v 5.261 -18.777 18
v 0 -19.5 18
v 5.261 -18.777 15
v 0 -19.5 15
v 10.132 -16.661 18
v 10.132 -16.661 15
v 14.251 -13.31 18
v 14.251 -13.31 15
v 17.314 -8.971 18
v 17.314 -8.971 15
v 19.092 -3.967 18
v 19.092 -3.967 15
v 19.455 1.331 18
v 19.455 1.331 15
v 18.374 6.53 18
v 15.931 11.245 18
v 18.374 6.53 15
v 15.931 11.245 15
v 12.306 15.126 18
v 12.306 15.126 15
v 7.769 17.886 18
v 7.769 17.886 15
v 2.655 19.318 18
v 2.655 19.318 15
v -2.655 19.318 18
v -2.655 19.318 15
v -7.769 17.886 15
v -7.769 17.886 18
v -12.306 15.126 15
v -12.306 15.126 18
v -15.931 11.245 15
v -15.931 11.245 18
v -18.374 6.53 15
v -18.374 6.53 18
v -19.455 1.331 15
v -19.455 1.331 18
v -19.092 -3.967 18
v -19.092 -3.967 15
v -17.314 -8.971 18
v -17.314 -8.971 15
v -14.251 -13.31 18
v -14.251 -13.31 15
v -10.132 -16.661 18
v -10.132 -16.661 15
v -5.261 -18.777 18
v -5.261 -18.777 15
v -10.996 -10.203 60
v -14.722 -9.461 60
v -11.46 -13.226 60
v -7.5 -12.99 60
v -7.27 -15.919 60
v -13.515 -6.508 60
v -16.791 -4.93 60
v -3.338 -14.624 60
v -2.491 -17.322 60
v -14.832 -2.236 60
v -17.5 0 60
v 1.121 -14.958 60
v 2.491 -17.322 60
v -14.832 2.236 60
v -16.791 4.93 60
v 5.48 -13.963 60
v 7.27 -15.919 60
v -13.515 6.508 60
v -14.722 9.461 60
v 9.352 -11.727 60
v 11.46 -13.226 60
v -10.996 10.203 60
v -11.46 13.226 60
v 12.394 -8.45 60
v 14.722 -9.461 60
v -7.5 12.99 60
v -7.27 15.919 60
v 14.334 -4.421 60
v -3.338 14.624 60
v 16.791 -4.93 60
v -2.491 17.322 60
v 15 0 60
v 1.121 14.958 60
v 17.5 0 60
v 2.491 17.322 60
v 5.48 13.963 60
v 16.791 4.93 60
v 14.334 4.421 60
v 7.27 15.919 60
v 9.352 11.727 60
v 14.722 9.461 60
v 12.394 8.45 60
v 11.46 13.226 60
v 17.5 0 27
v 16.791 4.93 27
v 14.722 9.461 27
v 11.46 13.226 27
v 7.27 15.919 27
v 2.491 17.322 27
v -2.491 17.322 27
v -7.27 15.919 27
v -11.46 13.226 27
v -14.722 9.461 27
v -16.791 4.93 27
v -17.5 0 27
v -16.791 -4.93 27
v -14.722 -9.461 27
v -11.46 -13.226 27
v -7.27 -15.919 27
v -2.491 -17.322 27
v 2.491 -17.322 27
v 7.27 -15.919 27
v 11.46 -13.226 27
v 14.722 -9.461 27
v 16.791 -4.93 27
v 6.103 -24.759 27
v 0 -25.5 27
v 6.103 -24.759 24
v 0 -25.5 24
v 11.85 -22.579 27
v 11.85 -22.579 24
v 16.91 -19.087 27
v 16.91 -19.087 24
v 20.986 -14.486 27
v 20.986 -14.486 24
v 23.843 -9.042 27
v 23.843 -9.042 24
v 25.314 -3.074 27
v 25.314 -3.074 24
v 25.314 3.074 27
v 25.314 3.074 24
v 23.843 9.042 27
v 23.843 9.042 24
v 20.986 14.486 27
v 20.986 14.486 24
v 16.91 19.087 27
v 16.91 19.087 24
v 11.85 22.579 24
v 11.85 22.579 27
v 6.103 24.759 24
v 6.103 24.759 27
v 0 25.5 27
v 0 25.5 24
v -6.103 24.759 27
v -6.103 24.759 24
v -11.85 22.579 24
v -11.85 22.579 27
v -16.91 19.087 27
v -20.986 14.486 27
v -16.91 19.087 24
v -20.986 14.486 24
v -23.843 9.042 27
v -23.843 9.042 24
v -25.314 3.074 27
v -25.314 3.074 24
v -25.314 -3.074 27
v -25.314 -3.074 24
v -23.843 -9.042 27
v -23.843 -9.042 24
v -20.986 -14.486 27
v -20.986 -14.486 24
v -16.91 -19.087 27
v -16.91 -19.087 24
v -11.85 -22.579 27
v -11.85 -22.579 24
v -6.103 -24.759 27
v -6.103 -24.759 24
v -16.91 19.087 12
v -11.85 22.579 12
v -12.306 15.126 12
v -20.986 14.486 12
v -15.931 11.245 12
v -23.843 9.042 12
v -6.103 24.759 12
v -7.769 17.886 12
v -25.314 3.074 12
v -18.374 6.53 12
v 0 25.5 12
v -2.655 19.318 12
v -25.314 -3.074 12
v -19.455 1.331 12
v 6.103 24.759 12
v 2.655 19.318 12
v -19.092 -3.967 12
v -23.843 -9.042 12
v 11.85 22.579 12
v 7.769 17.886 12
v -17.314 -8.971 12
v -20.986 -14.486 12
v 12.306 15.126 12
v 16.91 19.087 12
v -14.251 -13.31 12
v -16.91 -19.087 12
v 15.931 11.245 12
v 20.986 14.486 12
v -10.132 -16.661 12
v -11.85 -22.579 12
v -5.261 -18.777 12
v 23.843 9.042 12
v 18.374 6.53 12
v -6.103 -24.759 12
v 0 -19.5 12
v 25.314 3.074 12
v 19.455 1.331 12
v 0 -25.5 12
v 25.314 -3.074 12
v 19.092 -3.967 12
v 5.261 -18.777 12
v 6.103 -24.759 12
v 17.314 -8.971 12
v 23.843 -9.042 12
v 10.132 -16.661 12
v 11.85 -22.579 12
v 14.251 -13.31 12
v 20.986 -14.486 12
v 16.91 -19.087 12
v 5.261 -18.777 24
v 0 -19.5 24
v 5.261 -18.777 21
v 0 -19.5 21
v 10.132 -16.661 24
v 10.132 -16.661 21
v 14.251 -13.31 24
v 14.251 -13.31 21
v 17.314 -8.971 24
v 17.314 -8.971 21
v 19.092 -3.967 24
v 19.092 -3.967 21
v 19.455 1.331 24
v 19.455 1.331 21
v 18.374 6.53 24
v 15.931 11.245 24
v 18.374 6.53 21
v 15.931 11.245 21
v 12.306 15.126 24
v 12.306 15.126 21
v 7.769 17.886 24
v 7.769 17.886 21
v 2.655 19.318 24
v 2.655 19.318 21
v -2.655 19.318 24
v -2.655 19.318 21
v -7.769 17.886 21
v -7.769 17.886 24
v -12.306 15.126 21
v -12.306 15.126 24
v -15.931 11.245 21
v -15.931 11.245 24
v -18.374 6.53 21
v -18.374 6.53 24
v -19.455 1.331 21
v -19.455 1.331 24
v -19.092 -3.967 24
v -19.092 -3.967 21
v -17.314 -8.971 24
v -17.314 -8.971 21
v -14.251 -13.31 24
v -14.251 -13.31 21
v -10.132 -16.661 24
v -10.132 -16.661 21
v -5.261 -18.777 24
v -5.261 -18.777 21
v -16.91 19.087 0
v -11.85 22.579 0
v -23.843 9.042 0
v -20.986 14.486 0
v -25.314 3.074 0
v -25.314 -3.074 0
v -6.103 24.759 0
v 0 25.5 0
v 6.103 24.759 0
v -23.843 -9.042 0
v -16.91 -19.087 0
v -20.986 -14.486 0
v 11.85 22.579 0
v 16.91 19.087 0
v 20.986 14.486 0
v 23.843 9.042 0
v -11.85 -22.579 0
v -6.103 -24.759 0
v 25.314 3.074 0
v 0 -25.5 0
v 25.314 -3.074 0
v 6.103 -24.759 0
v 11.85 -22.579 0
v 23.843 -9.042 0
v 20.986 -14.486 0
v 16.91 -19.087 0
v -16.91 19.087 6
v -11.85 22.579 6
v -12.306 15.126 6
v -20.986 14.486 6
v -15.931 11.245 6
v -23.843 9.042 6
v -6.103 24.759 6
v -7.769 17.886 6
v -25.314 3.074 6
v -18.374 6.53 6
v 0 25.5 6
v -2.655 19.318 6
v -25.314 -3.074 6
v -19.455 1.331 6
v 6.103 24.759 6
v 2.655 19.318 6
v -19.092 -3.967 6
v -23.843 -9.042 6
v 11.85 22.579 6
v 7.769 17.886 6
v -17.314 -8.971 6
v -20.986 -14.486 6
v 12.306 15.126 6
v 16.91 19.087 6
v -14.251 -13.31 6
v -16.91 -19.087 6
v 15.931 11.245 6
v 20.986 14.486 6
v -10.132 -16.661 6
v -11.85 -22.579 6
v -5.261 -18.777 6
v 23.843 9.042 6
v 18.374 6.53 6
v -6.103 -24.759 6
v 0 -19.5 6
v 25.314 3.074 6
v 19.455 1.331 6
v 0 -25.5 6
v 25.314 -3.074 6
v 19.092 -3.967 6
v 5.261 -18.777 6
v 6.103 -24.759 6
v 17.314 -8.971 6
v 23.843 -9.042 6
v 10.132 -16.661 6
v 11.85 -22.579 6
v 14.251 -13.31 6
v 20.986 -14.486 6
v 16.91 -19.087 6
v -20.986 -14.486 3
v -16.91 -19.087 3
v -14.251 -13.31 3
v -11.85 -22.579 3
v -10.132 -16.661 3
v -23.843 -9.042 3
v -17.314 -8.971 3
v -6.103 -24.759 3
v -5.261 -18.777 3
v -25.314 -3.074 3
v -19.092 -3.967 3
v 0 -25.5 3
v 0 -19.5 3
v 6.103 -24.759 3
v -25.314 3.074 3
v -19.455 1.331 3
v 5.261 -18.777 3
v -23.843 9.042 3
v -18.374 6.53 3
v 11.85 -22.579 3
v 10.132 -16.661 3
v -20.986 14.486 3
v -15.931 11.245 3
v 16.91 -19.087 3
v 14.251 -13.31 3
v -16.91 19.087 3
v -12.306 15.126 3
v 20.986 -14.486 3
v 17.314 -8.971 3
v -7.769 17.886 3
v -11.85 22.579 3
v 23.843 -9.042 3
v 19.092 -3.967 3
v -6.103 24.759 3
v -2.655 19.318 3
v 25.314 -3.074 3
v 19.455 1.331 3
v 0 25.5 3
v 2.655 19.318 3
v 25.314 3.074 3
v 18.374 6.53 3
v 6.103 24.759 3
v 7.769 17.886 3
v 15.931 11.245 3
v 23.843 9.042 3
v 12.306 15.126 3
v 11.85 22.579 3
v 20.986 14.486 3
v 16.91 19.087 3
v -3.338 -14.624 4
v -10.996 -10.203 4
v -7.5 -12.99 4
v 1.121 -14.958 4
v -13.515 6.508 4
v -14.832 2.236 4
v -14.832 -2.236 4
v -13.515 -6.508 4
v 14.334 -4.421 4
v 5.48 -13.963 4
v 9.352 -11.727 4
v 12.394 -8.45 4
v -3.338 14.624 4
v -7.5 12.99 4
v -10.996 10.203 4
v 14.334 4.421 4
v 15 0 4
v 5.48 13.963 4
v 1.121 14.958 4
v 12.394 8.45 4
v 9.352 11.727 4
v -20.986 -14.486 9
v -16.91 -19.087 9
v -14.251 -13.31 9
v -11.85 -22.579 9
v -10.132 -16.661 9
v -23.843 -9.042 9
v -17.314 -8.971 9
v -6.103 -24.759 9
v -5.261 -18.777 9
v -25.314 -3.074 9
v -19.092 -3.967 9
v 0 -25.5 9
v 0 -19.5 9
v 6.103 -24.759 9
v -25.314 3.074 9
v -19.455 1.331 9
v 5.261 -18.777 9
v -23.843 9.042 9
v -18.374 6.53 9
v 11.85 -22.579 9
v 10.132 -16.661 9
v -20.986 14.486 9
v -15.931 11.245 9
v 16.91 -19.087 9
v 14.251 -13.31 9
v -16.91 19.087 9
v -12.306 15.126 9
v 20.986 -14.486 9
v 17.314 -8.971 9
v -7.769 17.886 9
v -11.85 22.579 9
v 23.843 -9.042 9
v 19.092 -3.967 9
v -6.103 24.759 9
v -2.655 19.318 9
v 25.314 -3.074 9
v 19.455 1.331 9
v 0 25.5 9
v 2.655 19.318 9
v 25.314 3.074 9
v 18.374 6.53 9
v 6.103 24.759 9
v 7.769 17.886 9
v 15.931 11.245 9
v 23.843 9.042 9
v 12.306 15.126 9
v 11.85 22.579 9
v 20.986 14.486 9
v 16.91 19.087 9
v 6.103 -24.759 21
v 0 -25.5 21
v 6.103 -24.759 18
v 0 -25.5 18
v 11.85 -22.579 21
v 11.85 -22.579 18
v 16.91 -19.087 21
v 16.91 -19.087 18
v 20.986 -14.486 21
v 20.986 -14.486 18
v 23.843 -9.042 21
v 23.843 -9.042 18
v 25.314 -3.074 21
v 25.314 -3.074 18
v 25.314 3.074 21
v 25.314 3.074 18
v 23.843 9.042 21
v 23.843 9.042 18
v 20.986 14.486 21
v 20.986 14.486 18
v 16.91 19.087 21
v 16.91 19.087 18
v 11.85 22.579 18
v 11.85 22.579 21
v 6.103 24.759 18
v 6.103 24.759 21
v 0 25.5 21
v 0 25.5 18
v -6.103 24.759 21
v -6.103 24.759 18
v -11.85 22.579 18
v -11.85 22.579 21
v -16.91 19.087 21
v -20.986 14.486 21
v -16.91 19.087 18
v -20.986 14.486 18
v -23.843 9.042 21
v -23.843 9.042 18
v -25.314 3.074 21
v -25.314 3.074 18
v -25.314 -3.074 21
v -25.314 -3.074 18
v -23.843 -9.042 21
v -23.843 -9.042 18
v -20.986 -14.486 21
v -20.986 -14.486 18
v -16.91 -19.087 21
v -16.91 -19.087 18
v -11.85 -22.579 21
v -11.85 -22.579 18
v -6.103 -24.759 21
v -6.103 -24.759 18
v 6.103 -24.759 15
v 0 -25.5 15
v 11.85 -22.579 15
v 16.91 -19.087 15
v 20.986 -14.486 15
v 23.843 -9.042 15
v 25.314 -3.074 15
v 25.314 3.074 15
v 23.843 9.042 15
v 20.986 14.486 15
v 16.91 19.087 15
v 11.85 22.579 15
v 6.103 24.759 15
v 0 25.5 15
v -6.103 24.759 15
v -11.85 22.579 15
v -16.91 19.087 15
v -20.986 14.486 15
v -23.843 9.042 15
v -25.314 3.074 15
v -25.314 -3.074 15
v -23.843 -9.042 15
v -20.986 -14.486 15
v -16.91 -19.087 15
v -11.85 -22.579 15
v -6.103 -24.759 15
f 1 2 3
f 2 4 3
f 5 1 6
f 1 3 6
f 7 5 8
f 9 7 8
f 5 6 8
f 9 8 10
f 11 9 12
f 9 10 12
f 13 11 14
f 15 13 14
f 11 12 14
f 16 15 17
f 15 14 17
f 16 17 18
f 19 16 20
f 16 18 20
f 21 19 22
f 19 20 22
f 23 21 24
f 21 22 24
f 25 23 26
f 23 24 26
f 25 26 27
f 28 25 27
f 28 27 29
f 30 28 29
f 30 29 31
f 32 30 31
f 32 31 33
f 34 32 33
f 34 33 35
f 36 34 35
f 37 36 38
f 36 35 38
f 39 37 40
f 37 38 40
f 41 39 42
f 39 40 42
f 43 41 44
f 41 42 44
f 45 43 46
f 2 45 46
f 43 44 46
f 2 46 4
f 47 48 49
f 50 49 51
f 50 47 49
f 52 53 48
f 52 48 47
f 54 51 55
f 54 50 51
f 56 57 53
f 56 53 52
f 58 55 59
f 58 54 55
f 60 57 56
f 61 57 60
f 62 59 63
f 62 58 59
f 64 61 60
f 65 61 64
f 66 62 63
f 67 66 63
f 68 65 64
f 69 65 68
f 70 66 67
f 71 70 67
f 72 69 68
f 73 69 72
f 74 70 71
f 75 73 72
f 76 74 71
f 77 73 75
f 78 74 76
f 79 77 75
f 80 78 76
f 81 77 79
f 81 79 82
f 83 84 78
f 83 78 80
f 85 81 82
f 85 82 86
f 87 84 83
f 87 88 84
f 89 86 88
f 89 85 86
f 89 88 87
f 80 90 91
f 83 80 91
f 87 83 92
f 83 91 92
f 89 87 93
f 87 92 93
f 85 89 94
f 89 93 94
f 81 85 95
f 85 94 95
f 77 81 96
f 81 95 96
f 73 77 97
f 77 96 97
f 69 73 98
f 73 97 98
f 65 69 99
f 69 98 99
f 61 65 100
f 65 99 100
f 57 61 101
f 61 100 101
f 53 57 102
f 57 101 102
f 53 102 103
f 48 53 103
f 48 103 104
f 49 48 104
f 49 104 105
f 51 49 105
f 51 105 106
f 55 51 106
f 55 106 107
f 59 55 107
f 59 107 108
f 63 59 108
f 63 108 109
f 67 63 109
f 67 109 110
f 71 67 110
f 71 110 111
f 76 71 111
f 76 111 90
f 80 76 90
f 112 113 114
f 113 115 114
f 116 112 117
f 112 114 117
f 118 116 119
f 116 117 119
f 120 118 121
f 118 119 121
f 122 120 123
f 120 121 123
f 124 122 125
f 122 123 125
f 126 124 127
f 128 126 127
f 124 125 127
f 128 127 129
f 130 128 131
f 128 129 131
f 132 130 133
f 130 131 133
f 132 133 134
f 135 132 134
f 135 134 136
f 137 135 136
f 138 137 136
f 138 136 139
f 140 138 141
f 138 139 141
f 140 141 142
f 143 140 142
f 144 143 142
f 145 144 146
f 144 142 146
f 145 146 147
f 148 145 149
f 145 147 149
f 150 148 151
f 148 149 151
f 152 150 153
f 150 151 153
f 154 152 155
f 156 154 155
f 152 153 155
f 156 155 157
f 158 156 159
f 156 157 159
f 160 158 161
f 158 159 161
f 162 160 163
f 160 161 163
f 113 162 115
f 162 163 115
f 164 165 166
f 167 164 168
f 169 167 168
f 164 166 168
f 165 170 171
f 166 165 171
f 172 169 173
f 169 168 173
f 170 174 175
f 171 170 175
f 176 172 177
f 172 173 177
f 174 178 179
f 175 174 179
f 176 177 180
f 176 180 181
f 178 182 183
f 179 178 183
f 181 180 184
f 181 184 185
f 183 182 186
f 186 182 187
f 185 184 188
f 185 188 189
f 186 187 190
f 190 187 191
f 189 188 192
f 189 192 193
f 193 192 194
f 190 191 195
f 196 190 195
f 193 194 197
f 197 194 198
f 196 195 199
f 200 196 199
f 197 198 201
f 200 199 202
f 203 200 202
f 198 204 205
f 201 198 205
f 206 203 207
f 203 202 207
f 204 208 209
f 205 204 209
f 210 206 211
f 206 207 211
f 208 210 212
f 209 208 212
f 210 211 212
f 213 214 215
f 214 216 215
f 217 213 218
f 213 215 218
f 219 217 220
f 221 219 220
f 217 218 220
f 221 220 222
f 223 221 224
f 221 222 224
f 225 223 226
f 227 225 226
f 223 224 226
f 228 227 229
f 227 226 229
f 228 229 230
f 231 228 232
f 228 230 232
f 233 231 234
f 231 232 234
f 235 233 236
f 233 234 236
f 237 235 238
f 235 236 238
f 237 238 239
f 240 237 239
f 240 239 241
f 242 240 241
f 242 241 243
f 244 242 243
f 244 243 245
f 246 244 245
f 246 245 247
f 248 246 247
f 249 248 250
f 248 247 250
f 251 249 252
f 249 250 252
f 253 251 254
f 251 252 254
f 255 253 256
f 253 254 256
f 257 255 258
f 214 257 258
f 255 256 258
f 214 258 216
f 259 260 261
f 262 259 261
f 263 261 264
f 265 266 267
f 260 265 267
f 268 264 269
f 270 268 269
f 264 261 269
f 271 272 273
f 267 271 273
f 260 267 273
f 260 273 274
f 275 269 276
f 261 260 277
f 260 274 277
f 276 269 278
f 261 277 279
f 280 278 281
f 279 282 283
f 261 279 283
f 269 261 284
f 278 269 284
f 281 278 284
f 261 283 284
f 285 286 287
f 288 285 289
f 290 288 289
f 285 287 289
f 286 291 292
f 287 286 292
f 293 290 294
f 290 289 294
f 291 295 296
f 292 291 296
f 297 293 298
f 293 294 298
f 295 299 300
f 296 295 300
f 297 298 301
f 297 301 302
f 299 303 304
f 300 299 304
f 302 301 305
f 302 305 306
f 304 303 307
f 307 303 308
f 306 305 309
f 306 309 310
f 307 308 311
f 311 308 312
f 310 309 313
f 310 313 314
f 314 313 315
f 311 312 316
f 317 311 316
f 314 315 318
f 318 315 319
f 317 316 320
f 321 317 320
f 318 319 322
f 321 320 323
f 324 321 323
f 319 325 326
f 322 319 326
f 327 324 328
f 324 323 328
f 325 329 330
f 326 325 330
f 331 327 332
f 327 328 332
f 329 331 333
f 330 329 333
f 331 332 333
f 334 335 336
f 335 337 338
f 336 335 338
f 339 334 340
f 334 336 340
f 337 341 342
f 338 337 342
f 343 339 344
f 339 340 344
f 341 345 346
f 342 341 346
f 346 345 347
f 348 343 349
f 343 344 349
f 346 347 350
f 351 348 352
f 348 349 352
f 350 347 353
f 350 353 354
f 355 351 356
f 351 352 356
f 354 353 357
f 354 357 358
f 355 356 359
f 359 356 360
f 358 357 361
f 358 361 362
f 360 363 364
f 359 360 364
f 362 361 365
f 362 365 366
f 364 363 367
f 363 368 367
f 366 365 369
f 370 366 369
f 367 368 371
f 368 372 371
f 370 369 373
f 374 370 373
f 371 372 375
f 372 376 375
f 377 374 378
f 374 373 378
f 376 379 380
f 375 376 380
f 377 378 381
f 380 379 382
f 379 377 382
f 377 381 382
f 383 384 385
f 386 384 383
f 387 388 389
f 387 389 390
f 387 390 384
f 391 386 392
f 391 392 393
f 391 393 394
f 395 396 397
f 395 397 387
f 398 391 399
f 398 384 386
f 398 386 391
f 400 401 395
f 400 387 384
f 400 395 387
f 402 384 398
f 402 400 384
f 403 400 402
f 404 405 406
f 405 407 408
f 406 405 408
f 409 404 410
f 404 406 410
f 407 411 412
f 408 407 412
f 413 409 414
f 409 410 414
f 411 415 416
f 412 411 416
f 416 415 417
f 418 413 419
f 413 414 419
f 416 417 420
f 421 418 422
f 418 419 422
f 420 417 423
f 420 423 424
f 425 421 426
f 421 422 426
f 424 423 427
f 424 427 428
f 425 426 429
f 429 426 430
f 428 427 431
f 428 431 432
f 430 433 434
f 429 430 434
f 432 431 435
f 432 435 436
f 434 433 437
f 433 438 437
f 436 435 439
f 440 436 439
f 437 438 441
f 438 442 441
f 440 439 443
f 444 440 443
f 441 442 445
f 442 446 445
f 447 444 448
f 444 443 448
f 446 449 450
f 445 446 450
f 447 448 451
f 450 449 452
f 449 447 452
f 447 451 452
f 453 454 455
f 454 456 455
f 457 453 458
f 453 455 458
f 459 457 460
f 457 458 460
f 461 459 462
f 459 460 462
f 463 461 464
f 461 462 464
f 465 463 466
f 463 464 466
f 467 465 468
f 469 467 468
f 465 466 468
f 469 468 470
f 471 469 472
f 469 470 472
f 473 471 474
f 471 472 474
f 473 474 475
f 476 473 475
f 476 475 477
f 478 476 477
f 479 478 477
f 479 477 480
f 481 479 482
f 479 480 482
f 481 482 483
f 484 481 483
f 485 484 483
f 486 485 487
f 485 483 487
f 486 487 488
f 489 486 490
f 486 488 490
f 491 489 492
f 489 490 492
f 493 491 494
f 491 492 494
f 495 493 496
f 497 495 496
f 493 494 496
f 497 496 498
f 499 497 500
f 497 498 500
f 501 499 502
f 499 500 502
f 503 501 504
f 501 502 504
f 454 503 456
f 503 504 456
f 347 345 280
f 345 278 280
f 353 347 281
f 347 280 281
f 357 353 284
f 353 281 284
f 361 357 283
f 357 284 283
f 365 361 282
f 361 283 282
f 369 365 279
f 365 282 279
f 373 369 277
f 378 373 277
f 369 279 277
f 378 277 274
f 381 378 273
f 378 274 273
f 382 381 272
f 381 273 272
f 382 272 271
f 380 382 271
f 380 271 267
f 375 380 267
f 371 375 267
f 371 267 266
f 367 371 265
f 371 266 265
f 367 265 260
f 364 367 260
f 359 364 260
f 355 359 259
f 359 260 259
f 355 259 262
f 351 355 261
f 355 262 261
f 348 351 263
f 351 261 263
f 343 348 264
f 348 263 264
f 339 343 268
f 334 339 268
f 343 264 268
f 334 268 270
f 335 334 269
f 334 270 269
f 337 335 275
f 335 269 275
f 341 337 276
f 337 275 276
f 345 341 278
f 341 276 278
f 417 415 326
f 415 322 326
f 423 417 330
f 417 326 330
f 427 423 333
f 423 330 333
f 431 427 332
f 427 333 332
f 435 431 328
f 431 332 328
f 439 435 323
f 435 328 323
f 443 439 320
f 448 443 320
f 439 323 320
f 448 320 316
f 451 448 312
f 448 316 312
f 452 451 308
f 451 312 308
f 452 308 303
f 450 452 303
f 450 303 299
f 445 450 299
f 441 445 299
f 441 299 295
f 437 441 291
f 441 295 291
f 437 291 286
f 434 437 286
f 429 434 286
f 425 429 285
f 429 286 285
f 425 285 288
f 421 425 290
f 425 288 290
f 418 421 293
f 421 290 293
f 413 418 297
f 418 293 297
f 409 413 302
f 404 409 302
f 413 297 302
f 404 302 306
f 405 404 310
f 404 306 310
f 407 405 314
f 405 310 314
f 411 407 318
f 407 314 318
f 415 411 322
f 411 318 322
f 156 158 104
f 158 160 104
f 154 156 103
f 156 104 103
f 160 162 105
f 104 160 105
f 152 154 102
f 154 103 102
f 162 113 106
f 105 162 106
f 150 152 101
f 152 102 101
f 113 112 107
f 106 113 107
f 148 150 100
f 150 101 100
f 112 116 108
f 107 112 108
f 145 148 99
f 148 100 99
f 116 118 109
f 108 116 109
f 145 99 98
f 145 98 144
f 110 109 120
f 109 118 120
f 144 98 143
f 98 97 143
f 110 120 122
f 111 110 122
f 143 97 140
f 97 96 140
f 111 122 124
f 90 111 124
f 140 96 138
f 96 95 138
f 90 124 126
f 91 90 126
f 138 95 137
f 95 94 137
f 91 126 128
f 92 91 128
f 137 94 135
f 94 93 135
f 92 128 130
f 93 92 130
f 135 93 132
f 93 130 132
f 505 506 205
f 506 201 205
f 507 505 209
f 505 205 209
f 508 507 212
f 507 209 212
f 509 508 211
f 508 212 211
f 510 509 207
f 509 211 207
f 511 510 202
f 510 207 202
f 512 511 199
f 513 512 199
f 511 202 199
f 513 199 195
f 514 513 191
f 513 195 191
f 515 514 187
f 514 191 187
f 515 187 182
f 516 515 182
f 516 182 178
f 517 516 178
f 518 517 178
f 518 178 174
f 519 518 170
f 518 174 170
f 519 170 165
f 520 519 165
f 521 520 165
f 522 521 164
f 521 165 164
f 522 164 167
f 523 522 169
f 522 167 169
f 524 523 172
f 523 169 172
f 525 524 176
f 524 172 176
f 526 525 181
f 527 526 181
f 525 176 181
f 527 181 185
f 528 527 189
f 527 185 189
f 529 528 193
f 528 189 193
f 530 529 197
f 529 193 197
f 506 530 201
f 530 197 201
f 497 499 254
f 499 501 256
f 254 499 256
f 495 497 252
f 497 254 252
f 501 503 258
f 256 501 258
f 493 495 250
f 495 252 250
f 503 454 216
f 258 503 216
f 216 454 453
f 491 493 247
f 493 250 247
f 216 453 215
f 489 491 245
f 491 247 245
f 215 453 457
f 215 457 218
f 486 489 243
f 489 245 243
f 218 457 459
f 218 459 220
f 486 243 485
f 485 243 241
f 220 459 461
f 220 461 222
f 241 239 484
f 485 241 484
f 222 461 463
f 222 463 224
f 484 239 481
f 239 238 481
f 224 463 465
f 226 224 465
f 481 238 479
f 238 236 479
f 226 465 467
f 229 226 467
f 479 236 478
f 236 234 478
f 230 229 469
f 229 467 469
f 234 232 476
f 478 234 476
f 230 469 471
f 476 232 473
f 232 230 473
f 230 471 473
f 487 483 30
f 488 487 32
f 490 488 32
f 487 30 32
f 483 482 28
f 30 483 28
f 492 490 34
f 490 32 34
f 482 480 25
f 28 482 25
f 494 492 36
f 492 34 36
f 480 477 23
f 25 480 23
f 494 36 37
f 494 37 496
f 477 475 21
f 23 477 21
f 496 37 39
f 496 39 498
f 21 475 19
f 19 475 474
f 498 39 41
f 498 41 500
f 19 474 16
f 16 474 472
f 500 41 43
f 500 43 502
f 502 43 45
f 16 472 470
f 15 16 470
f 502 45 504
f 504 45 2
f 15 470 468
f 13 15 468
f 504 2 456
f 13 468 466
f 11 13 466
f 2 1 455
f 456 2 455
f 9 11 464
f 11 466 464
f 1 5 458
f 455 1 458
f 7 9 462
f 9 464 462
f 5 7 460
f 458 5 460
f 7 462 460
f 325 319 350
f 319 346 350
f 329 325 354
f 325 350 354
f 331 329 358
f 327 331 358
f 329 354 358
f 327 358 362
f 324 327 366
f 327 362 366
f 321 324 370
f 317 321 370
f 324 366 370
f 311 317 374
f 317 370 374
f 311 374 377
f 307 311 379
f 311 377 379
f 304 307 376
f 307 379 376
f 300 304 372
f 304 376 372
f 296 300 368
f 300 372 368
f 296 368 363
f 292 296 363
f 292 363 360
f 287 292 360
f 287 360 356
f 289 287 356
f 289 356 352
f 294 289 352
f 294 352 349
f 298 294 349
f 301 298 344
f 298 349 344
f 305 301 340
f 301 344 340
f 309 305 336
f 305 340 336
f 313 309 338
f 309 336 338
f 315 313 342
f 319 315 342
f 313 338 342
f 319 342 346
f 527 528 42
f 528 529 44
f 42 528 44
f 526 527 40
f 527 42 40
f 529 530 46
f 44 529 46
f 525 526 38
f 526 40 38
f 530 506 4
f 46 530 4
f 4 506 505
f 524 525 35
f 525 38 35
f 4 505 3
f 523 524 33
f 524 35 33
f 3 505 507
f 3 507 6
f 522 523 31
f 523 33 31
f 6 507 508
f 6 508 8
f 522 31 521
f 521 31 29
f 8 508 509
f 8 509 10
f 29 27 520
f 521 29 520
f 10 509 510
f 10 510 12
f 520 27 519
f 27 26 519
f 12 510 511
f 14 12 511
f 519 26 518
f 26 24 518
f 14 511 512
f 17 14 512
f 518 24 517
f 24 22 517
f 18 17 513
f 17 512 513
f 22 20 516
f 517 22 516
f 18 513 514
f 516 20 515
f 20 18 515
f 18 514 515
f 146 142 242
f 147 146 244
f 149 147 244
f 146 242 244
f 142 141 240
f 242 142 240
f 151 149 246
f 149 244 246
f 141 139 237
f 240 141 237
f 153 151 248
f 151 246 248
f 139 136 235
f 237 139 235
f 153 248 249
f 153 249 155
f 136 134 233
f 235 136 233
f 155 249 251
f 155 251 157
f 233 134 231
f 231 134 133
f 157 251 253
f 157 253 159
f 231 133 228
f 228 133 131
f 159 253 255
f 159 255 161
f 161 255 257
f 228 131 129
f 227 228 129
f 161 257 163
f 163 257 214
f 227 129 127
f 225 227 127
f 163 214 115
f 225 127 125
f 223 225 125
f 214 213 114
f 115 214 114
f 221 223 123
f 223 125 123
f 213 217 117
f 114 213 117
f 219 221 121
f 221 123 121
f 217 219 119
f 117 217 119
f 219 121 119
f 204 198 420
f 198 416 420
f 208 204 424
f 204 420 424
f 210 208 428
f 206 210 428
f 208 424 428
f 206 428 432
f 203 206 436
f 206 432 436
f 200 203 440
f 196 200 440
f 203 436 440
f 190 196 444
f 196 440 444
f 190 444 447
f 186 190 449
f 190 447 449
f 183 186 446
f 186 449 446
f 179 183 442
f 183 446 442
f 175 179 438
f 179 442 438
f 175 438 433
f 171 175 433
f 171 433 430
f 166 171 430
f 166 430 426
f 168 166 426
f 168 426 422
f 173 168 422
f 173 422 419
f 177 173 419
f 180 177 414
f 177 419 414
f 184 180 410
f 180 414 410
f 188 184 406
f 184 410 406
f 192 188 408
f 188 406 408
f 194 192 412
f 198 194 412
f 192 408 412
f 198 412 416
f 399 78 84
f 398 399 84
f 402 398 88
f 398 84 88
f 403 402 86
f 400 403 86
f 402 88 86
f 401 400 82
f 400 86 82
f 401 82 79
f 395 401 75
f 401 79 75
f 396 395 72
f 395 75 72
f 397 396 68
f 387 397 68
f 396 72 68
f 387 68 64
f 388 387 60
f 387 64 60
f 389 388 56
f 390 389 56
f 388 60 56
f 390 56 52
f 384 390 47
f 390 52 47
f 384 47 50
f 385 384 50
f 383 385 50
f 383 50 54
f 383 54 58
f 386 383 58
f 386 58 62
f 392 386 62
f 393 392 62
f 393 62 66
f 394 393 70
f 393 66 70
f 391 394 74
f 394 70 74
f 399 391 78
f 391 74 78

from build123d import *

# Parameters (mm, degrees)
F0_R     = 17.5
F1_DEPTH = 60
F2_R     = 15
F3_DEPTH = 56


with BuildPart() as f1:
    # F0 (on Top) → F1 (new body)
    with BuildSketch(Plane.XY):
        Circle(F0_R)
    extrude(amount=F1_DEPTH)

    # F2 (on face) → F3 (cut)
    with BuildSketch(Plane.XY.offset(60)):
        Circle(F2_R)
    extrude(amount=-F3_DEPTH, mode=Mode.SUBTRACT)

    # F4 (on Right) → F5 (revolve)
    with BuildSketch(Plane.YZ):
        Polygon((-25.5, 3), (-25.5, 0), (-17.5, 0), (-17.5, 27), (-25.5, 27), (-25.5, 24), (-19.5, 24), (-19.5, 21), (-25.5, 21), (-25.5, 18), (-19.5, 18), (-19.5, 15), (-25.5, 15), (-25.5, 12), (-19.5, 12), (-19.5, 9), (-25.5, 9), (-25.5, 6), (-19.5, 6), (-19.5, 3), align=None)
    revolve(axis=Axis((0, 0, 13.5), (0, 0, 1)))


solid = f1.part
